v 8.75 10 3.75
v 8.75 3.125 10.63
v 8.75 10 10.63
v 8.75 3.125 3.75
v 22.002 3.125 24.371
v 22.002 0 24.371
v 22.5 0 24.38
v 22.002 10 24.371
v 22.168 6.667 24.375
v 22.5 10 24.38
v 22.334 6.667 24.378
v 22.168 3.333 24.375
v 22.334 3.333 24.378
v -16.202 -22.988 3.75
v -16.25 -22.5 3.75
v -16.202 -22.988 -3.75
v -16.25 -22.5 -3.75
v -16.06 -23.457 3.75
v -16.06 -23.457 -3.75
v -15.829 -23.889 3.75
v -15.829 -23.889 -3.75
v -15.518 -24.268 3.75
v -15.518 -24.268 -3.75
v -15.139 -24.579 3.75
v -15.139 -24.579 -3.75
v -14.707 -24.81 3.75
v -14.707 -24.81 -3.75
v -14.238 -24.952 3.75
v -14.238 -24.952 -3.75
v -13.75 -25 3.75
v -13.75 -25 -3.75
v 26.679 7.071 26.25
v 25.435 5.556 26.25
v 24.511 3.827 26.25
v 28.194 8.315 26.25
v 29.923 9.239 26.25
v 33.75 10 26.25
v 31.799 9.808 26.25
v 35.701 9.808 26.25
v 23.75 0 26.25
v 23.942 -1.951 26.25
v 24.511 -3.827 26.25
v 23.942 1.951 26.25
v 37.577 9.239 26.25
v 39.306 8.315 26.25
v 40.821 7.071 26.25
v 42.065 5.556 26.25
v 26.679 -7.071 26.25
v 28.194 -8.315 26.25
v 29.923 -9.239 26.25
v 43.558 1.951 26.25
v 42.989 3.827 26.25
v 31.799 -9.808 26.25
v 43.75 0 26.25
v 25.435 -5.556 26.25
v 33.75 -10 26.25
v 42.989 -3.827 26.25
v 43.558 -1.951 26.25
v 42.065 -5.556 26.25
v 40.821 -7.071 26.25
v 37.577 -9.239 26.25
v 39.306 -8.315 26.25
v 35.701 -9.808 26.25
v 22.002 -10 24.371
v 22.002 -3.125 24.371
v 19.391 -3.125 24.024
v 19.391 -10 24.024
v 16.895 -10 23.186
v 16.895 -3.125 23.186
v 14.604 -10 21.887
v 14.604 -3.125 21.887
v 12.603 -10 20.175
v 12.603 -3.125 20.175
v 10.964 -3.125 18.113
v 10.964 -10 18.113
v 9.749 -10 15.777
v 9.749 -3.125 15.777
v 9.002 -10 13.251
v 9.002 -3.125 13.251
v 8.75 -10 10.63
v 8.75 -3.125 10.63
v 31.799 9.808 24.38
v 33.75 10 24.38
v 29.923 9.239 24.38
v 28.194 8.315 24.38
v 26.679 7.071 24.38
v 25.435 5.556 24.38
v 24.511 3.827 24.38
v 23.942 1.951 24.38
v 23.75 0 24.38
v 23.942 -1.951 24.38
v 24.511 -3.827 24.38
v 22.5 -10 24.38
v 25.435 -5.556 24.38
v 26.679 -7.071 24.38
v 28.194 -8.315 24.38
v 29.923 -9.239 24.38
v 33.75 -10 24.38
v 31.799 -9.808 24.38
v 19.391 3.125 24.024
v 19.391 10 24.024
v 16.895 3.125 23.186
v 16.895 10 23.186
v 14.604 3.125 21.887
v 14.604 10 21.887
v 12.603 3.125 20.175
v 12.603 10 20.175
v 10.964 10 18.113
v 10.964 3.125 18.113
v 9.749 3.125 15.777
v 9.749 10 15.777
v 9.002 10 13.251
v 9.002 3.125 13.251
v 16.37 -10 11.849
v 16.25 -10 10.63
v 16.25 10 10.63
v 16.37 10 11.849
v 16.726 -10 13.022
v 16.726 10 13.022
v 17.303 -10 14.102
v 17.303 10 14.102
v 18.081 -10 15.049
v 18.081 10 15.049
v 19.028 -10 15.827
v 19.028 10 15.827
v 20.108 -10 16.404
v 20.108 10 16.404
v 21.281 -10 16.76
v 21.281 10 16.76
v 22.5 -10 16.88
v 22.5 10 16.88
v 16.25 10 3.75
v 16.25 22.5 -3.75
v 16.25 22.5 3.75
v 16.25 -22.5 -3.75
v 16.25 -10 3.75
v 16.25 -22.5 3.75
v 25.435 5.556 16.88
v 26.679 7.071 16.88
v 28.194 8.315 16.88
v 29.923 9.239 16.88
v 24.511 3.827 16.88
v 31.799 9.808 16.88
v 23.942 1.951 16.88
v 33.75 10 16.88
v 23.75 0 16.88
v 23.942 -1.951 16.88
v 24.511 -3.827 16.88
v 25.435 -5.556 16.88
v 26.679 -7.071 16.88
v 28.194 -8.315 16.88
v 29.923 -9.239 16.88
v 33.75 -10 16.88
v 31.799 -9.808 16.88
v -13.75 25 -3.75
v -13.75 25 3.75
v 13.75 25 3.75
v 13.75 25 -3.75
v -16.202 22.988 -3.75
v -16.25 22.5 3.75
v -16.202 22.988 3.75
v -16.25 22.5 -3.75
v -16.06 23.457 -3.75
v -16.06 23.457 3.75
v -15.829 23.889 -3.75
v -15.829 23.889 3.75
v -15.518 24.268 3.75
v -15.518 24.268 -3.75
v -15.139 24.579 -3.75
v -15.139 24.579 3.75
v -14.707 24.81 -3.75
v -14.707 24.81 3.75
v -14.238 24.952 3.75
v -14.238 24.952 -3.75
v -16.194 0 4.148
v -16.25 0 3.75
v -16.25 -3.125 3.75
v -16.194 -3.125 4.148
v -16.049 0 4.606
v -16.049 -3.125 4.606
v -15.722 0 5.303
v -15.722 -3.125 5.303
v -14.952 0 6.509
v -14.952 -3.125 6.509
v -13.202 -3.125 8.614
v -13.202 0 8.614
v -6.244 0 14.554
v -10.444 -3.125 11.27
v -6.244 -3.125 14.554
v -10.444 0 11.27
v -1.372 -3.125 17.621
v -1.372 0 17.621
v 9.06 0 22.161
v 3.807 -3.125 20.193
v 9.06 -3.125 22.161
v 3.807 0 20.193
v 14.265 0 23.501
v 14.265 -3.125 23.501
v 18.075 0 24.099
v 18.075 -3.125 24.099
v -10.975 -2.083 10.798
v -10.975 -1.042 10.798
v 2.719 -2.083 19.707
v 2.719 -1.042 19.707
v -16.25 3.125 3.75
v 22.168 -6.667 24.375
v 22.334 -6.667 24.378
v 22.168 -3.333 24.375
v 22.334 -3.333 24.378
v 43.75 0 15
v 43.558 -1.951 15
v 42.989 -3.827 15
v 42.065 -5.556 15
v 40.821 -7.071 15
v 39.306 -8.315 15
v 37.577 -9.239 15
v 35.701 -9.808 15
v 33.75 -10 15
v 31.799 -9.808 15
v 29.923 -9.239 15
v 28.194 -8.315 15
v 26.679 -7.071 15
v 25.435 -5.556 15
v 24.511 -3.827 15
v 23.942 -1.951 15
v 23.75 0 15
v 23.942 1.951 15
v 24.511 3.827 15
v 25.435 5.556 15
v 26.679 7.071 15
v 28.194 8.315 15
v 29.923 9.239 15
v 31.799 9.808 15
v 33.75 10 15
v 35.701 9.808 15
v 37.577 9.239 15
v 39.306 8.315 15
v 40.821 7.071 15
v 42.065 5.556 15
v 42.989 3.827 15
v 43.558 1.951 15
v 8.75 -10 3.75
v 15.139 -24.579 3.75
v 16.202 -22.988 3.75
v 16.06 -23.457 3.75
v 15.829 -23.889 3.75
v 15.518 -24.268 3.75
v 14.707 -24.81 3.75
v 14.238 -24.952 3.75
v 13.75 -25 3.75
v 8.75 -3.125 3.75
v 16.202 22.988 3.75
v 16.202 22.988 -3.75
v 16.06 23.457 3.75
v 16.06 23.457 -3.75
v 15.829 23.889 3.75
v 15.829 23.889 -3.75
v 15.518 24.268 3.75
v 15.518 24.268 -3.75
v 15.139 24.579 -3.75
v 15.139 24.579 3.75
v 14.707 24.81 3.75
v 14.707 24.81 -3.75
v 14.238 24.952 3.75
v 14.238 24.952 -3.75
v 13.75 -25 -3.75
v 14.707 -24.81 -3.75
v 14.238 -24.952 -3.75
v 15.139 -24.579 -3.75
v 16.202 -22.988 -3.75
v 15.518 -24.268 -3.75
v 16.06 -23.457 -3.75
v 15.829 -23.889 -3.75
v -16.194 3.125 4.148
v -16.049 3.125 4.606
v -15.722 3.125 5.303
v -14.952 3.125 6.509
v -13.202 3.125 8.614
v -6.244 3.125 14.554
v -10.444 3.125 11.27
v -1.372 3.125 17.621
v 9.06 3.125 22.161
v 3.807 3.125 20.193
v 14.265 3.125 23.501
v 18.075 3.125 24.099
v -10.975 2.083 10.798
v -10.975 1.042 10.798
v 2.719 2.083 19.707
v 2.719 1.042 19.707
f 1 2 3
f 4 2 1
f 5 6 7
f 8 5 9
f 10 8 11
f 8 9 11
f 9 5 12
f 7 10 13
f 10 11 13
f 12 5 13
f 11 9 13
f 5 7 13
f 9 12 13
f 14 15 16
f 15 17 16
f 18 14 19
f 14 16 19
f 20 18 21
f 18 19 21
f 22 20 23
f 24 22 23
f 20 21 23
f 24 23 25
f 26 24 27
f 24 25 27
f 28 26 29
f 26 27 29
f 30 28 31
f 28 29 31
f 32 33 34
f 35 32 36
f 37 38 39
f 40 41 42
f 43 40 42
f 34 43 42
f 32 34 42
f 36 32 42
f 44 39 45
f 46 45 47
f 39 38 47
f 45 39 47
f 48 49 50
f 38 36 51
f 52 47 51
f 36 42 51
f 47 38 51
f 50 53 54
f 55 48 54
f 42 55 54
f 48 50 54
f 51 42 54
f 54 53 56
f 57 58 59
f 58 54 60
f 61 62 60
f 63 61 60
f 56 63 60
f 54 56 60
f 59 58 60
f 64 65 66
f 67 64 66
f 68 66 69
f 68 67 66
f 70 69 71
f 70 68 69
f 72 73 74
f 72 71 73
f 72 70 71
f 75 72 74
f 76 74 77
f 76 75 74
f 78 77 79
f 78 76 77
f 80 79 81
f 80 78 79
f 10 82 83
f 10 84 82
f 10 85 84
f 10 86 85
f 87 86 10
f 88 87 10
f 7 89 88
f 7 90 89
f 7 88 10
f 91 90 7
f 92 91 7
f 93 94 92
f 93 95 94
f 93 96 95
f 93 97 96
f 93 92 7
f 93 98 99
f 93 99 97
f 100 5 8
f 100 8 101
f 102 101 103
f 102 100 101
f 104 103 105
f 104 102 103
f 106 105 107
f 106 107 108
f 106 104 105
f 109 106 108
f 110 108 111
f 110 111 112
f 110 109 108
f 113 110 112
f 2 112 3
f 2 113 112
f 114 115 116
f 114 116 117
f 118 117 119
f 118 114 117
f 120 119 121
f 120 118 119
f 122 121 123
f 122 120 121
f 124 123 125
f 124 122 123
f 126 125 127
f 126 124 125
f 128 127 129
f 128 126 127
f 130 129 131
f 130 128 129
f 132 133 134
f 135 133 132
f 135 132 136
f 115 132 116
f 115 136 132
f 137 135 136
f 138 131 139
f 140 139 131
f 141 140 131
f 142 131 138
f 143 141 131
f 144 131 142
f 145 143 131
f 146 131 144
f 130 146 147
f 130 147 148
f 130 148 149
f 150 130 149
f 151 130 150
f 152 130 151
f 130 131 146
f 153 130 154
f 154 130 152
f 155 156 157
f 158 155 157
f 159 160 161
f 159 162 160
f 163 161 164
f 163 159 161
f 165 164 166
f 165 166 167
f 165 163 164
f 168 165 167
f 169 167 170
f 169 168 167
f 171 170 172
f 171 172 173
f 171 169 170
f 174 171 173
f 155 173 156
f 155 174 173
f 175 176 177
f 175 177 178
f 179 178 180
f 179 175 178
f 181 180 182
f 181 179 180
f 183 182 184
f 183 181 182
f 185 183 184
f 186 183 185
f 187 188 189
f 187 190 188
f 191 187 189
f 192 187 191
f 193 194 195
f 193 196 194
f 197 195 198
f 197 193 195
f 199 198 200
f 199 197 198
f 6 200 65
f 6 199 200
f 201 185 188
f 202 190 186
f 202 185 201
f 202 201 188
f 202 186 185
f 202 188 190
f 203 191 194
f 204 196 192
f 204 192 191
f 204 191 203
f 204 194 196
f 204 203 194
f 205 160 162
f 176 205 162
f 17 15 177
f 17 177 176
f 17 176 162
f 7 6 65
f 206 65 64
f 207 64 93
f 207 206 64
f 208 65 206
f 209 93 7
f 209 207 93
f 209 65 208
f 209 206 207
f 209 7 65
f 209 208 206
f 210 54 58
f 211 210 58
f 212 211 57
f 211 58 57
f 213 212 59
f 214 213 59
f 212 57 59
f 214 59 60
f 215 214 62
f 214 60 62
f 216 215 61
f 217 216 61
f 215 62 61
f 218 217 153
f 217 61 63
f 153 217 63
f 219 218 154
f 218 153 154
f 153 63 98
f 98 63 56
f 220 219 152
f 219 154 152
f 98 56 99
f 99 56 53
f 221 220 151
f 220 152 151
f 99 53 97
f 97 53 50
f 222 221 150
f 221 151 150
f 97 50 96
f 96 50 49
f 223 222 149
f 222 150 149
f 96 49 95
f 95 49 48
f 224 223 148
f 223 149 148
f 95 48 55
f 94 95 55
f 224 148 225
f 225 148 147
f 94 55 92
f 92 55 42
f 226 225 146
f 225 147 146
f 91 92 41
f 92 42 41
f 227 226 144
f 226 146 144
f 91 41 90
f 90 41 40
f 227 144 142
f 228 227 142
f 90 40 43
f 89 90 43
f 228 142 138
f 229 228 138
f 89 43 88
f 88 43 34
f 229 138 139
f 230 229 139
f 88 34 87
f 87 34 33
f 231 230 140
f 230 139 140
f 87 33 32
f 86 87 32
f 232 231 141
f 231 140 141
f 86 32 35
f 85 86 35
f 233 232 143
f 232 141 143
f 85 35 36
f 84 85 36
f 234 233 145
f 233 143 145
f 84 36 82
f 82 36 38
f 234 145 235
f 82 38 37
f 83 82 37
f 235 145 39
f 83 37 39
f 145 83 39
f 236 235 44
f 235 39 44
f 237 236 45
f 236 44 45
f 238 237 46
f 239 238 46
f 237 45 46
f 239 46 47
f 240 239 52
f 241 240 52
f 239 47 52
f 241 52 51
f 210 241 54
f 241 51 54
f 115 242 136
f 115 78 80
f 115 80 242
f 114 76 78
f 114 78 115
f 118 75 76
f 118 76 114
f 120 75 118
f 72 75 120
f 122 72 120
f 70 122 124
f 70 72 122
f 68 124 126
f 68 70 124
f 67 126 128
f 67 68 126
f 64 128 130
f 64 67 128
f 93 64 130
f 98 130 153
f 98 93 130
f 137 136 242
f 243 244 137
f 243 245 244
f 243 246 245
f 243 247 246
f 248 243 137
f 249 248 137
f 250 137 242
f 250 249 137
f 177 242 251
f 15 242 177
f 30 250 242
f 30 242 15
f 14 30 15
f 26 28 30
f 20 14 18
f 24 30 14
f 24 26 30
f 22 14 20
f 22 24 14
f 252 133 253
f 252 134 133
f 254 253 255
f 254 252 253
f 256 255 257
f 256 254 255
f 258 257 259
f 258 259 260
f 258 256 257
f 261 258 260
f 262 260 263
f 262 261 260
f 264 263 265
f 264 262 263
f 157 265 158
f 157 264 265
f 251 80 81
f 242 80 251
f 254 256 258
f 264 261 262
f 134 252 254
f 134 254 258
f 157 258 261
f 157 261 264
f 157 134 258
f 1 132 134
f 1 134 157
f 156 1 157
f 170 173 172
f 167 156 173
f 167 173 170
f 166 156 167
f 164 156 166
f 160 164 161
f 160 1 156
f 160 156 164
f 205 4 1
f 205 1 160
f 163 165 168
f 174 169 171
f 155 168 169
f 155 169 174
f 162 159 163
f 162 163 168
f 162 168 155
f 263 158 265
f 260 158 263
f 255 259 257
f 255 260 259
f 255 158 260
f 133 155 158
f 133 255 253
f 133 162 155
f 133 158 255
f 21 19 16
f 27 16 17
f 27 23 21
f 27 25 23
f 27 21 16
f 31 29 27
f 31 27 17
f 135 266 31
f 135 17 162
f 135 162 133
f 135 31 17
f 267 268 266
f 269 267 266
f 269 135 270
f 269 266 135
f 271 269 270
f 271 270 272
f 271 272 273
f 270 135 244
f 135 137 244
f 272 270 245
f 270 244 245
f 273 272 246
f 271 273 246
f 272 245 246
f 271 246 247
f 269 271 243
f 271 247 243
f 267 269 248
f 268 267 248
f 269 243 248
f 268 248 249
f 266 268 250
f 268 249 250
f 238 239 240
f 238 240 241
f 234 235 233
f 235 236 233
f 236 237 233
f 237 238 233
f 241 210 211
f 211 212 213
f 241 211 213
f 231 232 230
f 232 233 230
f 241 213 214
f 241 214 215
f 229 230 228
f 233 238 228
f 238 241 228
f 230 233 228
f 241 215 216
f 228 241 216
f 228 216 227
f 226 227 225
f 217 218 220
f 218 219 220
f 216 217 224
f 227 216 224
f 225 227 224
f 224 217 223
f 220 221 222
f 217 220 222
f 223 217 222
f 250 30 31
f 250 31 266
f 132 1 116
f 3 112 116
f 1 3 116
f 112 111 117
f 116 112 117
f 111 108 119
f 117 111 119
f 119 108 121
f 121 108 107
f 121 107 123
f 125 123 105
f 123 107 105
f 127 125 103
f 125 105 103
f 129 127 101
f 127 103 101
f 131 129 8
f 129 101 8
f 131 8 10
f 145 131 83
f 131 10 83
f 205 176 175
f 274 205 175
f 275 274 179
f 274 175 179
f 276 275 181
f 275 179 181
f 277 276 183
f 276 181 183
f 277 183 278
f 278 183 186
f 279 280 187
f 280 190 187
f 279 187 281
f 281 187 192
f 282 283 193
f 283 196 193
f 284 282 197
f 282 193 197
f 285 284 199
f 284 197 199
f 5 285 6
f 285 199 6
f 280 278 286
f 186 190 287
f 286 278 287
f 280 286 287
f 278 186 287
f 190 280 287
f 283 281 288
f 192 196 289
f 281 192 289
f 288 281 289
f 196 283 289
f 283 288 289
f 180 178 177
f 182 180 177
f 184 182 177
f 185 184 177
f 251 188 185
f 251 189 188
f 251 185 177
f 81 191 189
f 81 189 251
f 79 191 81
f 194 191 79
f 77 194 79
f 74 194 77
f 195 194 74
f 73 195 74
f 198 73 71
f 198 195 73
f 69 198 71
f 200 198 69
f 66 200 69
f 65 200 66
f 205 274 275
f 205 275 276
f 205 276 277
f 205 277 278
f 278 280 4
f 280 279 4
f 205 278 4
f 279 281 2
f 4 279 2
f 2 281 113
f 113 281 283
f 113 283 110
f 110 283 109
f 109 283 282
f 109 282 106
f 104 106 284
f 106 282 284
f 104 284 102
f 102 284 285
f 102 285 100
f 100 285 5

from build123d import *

# Parameters (mm, degrees)
F1_DEPTH = 25
F0_W     = 10
F0_H     = 7.5
F2_DEPTH = 10
F3_DEPTH = 3.125
F5_R     = 2.5


# Not quite as in the source:
# - a feature names something its author has since deleted; it is built from what else it names


with BuildPart() as f1:
    # F0 (on Front) → F1 (new body, symmetric)
    with BuildSketch(Plane.XZ):
        Polygon((16.25, -3.75), (16.25, 3.75), (8.75, 3.75), (-16.25, 3.75), (-16.25, -3.75), align=None)
    extrude(amount=F1_DEPTH, both=True)

    # F0 (on Front) → F2 (join, symmetric)
    with BuildSketch(Plane.XZ):
        with BuildLine():
            Line((8.75, 3.75), (16.25, 3.75))
            Line((16.25, 3.75), (16.25, 10.63))
            ThreePointArc((16.25, 10.63), (18.0805826176, 15.0494173824), (22.5, 16.88))
            Line((22.5, 16.88), (23.75, 16.88))
            Line((23.75, 16.88), (23.75, 24.38))
            Line((23.75, 24.38), (22.5, 24.38))
            add(Edge.make_bspline(
                [(22.0015189443, 24.3709612705), (22.1674265419, 24.3749356352), (22.3335889493, 24.3779529773), (22.5, 24.38)],
                knots=[43.5574597922, 43.5574597922, 43.5574597922, 43.5574597922, 43.8994236864, 43.8994236864, 43.8994236864, 43.8994236864], degree=3))
            ThreePointArc((22.0015189443, 24.3709612705), (12.6026110889, 20.1748516354), (8.75, 10.63))
            Line((8.75, 10.63), (8.75, 3.75))
        make_face()
        with Locations((28.75, 20.63)):
            Rectangle(F0_W, F0_H)
    extrude(amount=F2_DEPTH, both=True)

    # F0 (on Front) → F3 (join, symmetric)
    with BuildSketch(Plane.XZ):
        with BuildLine():
            Line((-16.25, 3.75), (8.75, 3.75))
            Line((8.75, 3.75), (8.75, 10.63))
            ThreePointArc((8.75, 10.63), (12.6026110889, 20.1748516354), (22.0015189443, 24.3709612705))
            add(Edge.make_bspline(
                [(-16.25, 3.75), (-16.1291590572, 7.8315246284), (0.86913148, 23.864728791), (22.0015189443, 24.3709612705)],
                knots=[0, 0, 0, 0, 43.5574597922, 43.5574597922, 43.5574597922, 43.5574597922], degree=3))
        make_face()
    extrude(amount=F3_DEPTH, both=True)

    # F0 (on Front) → F4 (revolve)
    with BuildSketch(Plane.XZ):
        Polygon((33.75, 24.38), (33.75, 16.88), (33.75, 15), (43.75, 15), (43.75, 26.25), (33.75, 26.25), align=None)
    revolve(axis=Axis((33.75, 0, 20.625), (0, 0, -1)))

    # F5
    f5_edges = [f1.edges().sort_by_distance(p)[0] for p in [
        (-16.25, -25, 0),
        (16.25, -25, 0),
        (-16.25, 25, 0),
        (16.25, 25, 0),
    ]]
    fillet(f5_edges, radius=F5_R)


solid = f1.part
